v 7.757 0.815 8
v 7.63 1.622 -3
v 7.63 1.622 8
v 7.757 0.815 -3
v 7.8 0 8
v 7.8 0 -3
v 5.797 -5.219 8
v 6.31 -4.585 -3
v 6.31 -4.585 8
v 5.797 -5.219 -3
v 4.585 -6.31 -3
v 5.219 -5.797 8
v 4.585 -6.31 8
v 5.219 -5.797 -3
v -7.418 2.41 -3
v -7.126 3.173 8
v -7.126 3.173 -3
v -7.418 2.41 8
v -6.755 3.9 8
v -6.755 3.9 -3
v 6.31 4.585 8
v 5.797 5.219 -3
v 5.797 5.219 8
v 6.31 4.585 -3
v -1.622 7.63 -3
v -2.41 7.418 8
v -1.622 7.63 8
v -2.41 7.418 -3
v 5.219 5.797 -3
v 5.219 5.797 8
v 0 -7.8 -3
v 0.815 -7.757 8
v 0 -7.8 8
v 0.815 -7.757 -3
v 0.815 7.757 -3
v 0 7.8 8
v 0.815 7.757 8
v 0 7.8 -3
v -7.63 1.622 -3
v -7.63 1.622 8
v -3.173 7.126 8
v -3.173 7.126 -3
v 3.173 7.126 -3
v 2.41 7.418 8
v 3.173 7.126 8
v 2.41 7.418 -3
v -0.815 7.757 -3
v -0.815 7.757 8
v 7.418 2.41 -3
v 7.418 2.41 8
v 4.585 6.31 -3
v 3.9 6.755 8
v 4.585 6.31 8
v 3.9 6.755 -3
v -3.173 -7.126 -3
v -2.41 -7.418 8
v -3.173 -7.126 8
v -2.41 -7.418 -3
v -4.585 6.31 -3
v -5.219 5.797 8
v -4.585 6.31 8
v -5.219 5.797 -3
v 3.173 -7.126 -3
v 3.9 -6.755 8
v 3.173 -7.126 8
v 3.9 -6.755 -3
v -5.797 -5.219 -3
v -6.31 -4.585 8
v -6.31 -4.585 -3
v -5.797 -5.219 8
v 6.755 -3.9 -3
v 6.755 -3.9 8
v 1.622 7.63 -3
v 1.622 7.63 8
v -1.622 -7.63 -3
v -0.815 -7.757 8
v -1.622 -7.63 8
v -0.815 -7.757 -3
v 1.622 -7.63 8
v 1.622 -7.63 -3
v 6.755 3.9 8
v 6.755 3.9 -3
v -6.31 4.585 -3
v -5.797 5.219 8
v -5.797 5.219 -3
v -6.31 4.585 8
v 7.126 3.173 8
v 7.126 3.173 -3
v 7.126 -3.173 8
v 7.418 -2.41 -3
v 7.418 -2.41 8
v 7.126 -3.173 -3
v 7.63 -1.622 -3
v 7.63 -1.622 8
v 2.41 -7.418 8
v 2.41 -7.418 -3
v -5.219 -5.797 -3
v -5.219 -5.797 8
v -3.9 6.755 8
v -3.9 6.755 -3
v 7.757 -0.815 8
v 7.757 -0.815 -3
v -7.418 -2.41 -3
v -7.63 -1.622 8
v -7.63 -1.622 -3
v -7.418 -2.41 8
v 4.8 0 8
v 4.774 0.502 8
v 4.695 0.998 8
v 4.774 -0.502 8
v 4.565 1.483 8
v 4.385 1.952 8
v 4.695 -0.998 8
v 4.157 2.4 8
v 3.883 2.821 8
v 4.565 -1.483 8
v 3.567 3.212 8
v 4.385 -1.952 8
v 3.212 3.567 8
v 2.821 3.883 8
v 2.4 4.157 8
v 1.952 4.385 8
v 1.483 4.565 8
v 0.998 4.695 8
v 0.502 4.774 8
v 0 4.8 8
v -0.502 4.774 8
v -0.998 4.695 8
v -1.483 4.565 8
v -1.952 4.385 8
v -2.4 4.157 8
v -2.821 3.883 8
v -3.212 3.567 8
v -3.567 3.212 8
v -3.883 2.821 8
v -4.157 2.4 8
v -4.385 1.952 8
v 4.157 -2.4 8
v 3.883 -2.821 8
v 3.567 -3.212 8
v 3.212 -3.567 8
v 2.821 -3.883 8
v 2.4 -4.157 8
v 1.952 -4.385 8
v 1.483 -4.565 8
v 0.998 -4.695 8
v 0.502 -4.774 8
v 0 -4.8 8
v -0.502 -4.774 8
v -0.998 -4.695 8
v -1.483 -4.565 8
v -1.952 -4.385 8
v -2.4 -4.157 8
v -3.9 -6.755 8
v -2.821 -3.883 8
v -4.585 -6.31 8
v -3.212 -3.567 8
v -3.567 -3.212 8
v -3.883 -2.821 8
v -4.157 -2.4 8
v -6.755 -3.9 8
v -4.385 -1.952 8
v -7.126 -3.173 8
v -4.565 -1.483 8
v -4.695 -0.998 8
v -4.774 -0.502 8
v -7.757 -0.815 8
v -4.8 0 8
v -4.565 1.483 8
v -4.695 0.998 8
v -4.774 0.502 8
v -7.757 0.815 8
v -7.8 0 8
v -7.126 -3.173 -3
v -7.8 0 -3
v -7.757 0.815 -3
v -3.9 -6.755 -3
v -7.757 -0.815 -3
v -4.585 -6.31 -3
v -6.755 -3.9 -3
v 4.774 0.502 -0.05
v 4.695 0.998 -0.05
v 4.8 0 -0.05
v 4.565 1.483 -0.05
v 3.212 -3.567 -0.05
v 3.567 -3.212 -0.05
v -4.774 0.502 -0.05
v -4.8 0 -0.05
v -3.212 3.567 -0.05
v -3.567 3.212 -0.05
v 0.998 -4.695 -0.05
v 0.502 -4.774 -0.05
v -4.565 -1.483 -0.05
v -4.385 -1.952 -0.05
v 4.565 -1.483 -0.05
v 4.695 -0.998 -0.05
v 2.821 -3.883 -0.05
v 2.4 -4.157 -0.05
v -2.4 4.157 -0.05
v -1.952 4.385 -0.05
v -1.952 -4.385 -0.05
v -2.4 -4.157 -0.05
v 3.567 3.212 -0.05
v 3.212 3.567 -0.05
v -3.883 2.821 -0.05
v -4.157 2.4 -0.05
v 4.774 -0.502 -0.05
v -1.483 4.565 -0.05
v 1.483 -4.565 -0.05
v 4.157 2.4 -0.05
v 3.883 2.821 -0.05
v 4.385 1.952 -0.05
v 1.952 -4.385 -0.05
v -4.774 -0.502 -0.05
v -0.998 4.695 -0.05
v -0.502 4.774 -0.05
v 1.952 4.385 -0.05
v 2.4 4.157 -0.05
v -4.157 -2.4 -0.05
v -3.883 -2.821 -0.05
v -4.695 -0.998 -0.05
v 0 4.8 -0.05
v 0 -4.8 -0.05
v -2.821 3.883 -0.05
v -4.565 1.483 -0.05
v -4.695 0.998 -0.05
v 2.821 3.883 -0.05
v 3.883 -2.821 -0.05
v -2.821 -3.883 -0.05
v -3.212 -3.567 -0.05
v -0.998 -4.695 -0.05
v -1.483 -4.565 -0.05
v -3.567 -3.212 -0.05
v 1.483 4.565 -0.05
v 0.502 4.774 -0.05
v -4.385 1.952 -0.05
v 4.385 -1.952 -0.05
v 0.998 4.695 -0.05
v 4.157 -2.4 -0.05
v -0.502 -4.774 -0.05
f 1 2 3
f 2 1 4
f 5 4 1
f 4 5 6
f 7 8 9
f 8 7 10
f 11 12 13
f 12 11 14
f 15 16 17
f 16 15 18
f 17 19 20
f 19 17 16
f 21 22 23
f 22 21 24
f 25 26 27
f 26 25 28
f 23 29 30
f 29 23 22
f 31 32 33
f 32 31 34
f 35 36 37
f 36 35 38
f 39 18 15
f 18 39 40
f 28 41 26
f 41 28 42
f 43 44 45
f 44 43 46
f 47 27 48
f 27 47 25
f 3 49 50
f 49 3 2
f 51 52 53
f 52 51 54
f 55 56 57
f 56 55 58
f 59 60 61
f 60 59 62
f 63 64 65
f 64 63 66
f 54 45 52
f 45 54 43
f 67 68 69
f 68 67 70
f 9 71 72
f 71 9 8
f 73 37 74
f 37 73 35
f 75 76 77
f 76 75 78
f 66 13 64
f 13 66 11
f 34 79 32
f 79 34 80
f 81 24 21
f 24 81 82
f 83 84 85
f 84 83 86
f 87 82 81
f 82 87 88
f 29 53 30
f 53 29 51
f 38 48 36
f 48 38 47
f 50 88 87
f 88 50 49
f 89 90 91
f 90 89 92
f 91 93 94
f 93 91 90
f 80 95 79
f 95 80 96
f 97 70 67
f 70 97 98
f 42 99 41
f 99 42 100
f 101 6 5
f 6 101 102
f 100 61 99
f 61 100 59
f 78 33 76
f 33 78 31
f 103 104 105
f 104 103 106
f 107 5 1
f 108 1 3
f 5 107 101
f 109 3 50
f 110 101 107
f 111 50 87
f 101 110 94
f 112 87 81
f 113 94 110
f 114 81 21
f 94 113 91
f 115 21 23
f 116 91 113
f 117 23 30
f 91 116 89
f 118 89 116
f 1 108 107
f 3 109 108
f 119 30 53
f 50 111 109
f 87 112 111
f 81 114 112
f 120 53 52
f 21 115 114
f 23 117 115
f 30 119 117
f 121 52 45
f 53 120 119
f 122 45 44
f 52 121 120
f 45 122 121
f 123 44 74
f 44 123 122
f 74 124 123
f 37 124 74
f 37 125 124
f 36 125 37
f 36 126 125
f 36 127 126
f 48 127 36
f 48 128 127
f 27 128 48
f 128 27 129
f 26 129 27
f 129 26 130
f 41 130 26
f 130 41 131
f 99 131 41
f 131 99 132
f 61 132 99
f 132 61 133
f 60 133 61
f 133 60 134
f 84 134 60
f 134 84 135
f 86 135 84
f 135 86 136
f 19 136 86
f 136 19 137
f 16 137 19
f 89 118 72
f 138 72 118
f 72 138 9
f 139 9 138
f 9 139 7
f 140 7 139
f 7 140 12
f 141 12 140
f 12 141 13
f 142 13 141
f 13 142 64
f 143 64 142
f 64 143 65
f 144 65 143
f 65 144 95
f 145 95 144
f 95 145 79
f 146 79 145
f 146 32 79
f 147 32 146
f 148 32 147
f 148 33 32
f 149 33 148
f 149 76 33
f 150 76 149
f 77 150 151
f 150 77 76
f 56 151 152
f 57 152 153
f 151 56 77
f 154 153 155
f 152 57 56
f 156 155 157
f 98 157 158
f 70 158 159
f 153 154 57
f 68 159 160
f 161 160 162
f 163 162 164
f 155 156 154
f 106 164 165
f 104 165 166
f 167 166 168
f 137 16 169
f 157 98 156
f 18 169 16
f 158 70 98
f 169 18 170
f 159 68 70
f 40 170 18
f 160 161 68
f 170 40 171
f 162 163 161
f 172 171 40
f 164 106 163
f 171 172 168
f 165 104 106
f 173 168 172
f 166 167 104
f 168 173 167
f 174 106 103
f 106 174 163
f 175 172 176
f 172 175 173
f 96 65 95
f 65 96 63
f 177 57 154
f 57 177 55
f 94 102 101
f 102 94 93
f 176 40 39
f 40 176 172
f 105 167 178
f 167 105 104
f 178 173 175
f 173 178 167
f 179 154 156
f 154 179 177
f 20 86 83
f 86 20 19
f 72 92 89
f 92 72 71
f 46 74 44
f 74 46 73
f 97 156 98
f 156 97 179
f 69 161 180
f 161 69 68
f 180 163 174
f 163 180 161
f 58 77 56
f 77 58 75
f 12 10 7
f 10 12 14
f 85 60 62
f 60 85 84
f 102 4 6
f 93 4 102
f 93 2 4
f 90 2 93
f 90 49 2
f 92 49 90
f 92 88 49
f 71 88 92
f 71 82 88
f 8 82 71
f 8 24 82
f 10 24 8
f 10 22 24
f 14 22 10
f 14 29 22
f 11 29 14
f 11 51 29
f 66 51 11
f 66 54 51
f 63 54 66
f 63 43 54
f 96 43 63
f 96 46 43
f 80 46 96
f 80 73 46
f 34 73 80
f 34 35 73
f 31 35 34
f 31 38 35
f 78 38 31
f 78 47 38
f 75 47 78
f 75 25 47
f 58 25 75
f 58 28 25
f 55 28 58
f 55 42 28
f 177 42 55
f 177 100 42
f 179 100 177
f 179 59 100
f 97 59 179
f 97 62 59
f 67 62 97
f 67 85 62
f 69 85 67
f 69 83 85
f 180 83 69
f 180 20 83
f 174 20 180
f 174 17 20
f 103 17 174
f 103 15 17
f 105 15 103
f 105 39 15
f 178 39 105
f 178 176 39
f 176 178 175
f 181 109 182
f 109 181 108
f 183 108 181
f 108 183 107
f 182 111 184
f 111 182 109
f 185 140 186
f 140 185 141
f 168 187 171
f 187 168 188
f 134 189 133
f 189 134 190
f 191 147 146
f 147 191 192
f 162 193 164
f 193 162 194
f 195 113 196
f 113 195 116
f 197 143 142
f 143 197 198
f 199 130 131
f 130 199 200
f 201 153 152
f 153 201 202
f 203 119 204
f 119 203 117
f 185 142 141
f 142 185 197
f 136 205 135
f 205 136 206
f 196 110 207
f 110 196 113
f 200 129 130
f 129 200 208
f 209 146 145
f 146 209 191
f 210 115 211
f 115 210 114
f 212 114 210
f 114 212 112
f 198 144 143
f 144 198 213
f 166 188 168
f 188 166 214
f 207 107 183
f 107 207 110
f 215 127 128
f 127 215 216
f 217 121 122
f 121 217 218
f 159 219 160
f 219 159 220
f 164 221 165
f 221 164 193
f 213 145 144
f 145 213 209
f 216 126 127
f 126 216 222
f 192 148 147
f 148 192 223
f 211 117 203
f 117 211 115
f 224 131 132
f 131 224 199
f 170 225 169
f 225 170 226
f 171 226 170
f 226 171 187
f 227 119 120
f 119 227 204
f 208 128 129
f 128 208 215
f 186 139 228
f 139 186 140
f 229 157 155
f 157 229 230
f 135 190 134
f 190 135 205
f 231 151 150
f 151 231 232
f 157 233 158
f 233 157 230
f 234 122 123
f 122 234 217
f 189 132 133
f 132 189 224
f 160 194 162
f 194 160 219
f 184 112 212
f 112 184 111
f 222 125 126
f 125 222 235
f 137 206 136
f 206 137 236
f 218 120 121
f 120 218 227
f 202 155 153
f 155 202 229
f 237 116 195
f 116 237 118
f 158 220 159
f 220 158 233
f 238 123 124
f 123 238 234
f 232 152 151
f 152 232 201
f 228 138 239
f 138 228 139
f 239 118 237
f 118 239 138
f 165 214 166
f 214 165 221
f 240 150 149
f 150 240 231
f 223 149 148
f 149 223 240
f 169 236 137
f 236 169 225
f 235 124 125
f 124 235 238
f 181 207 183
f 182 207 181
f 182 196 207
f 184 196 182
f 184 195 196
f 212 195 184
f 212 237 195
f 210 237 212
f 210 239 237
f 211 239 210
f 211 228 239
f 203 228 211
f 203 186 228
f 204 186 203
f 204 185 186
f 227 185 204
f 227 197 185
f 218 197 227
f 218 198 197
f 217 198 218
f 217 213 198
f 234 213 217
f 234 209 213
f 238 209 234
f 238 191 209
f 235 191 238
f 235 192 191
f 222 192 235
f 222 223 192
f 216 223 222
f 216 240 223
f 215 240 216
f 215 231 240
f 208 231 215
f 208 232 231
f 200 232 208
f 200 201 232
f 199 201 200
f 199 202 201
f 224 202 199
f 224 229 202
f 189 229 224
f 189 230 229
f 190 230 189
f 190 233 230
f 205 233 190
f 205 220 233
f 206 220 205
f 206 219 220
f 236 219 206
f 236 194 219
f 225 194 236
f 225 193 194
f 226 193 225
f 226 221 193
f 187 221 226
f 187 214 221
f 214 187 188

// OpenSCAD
// -----------------------------------------------------------
// Customizable Socket Organizers: Circular End Cap
// -----------------------------------------------------------
//
// Zemba Craftworks
// youtube.com/zembacraftworks
// thingiverse.com/zembacraftworks/about

// This is a configurable, 3D printable insert designed to
// slide onto a metal or wooden bar to create socket set
// organizers. Dimensions can be adjusted for sockets of
// all sizes and to slide onto bars/holders of any size.

// Date Created:  2018-08-15
// Last Modified: 2018-12-19

// Critical Dimensions
// -------------------
// Adjust these dimensions and verify them with a test print
// before printing holders for all of your sockets! You want a
// snug fit but not so tight that anything gets stuck. These
// values will vary depending on your sockets, the rail you're
// using, and the calibration of your printer.


rr = 4.8;           // Dowel Radius (mm)
                    // (4.8 = approximately 3/8 in * 25.4 mm/in / 2)
fn1 = 60;           // Number of Facets for Curvature 

ct = 3;             // Wall Thickness of End Cap (mm)
ch = 8;             // Height of End Cap (mm)
       
// Tolerance Value
// ---------------
// When shapes are subtracted through difference() in
// OpenSCAD, there is ambiguity if any faces of the two shapes
// occupy the same space. Adding a small value 't' to make
// the subtracted shape slightly larger prevents this.

t = 0.1;

// Create End Cap
union(){

    // Dowel Clamp
    difference(){ 
        union(){
            // Main Dowel Clamp
            cylinder(r=rr+ct,h=ch,$fn=fn1);
            // Main Dowel Cap
            translate([0,0,-ct])
                cylinder(r=rr+ct,h=ct,$fn=fn1);
        }

        // Dowel Volume
        translate([0,0,-t/2])
        cylinder(r=rr,h=ch+t,$fn=fn1);
    }
}
